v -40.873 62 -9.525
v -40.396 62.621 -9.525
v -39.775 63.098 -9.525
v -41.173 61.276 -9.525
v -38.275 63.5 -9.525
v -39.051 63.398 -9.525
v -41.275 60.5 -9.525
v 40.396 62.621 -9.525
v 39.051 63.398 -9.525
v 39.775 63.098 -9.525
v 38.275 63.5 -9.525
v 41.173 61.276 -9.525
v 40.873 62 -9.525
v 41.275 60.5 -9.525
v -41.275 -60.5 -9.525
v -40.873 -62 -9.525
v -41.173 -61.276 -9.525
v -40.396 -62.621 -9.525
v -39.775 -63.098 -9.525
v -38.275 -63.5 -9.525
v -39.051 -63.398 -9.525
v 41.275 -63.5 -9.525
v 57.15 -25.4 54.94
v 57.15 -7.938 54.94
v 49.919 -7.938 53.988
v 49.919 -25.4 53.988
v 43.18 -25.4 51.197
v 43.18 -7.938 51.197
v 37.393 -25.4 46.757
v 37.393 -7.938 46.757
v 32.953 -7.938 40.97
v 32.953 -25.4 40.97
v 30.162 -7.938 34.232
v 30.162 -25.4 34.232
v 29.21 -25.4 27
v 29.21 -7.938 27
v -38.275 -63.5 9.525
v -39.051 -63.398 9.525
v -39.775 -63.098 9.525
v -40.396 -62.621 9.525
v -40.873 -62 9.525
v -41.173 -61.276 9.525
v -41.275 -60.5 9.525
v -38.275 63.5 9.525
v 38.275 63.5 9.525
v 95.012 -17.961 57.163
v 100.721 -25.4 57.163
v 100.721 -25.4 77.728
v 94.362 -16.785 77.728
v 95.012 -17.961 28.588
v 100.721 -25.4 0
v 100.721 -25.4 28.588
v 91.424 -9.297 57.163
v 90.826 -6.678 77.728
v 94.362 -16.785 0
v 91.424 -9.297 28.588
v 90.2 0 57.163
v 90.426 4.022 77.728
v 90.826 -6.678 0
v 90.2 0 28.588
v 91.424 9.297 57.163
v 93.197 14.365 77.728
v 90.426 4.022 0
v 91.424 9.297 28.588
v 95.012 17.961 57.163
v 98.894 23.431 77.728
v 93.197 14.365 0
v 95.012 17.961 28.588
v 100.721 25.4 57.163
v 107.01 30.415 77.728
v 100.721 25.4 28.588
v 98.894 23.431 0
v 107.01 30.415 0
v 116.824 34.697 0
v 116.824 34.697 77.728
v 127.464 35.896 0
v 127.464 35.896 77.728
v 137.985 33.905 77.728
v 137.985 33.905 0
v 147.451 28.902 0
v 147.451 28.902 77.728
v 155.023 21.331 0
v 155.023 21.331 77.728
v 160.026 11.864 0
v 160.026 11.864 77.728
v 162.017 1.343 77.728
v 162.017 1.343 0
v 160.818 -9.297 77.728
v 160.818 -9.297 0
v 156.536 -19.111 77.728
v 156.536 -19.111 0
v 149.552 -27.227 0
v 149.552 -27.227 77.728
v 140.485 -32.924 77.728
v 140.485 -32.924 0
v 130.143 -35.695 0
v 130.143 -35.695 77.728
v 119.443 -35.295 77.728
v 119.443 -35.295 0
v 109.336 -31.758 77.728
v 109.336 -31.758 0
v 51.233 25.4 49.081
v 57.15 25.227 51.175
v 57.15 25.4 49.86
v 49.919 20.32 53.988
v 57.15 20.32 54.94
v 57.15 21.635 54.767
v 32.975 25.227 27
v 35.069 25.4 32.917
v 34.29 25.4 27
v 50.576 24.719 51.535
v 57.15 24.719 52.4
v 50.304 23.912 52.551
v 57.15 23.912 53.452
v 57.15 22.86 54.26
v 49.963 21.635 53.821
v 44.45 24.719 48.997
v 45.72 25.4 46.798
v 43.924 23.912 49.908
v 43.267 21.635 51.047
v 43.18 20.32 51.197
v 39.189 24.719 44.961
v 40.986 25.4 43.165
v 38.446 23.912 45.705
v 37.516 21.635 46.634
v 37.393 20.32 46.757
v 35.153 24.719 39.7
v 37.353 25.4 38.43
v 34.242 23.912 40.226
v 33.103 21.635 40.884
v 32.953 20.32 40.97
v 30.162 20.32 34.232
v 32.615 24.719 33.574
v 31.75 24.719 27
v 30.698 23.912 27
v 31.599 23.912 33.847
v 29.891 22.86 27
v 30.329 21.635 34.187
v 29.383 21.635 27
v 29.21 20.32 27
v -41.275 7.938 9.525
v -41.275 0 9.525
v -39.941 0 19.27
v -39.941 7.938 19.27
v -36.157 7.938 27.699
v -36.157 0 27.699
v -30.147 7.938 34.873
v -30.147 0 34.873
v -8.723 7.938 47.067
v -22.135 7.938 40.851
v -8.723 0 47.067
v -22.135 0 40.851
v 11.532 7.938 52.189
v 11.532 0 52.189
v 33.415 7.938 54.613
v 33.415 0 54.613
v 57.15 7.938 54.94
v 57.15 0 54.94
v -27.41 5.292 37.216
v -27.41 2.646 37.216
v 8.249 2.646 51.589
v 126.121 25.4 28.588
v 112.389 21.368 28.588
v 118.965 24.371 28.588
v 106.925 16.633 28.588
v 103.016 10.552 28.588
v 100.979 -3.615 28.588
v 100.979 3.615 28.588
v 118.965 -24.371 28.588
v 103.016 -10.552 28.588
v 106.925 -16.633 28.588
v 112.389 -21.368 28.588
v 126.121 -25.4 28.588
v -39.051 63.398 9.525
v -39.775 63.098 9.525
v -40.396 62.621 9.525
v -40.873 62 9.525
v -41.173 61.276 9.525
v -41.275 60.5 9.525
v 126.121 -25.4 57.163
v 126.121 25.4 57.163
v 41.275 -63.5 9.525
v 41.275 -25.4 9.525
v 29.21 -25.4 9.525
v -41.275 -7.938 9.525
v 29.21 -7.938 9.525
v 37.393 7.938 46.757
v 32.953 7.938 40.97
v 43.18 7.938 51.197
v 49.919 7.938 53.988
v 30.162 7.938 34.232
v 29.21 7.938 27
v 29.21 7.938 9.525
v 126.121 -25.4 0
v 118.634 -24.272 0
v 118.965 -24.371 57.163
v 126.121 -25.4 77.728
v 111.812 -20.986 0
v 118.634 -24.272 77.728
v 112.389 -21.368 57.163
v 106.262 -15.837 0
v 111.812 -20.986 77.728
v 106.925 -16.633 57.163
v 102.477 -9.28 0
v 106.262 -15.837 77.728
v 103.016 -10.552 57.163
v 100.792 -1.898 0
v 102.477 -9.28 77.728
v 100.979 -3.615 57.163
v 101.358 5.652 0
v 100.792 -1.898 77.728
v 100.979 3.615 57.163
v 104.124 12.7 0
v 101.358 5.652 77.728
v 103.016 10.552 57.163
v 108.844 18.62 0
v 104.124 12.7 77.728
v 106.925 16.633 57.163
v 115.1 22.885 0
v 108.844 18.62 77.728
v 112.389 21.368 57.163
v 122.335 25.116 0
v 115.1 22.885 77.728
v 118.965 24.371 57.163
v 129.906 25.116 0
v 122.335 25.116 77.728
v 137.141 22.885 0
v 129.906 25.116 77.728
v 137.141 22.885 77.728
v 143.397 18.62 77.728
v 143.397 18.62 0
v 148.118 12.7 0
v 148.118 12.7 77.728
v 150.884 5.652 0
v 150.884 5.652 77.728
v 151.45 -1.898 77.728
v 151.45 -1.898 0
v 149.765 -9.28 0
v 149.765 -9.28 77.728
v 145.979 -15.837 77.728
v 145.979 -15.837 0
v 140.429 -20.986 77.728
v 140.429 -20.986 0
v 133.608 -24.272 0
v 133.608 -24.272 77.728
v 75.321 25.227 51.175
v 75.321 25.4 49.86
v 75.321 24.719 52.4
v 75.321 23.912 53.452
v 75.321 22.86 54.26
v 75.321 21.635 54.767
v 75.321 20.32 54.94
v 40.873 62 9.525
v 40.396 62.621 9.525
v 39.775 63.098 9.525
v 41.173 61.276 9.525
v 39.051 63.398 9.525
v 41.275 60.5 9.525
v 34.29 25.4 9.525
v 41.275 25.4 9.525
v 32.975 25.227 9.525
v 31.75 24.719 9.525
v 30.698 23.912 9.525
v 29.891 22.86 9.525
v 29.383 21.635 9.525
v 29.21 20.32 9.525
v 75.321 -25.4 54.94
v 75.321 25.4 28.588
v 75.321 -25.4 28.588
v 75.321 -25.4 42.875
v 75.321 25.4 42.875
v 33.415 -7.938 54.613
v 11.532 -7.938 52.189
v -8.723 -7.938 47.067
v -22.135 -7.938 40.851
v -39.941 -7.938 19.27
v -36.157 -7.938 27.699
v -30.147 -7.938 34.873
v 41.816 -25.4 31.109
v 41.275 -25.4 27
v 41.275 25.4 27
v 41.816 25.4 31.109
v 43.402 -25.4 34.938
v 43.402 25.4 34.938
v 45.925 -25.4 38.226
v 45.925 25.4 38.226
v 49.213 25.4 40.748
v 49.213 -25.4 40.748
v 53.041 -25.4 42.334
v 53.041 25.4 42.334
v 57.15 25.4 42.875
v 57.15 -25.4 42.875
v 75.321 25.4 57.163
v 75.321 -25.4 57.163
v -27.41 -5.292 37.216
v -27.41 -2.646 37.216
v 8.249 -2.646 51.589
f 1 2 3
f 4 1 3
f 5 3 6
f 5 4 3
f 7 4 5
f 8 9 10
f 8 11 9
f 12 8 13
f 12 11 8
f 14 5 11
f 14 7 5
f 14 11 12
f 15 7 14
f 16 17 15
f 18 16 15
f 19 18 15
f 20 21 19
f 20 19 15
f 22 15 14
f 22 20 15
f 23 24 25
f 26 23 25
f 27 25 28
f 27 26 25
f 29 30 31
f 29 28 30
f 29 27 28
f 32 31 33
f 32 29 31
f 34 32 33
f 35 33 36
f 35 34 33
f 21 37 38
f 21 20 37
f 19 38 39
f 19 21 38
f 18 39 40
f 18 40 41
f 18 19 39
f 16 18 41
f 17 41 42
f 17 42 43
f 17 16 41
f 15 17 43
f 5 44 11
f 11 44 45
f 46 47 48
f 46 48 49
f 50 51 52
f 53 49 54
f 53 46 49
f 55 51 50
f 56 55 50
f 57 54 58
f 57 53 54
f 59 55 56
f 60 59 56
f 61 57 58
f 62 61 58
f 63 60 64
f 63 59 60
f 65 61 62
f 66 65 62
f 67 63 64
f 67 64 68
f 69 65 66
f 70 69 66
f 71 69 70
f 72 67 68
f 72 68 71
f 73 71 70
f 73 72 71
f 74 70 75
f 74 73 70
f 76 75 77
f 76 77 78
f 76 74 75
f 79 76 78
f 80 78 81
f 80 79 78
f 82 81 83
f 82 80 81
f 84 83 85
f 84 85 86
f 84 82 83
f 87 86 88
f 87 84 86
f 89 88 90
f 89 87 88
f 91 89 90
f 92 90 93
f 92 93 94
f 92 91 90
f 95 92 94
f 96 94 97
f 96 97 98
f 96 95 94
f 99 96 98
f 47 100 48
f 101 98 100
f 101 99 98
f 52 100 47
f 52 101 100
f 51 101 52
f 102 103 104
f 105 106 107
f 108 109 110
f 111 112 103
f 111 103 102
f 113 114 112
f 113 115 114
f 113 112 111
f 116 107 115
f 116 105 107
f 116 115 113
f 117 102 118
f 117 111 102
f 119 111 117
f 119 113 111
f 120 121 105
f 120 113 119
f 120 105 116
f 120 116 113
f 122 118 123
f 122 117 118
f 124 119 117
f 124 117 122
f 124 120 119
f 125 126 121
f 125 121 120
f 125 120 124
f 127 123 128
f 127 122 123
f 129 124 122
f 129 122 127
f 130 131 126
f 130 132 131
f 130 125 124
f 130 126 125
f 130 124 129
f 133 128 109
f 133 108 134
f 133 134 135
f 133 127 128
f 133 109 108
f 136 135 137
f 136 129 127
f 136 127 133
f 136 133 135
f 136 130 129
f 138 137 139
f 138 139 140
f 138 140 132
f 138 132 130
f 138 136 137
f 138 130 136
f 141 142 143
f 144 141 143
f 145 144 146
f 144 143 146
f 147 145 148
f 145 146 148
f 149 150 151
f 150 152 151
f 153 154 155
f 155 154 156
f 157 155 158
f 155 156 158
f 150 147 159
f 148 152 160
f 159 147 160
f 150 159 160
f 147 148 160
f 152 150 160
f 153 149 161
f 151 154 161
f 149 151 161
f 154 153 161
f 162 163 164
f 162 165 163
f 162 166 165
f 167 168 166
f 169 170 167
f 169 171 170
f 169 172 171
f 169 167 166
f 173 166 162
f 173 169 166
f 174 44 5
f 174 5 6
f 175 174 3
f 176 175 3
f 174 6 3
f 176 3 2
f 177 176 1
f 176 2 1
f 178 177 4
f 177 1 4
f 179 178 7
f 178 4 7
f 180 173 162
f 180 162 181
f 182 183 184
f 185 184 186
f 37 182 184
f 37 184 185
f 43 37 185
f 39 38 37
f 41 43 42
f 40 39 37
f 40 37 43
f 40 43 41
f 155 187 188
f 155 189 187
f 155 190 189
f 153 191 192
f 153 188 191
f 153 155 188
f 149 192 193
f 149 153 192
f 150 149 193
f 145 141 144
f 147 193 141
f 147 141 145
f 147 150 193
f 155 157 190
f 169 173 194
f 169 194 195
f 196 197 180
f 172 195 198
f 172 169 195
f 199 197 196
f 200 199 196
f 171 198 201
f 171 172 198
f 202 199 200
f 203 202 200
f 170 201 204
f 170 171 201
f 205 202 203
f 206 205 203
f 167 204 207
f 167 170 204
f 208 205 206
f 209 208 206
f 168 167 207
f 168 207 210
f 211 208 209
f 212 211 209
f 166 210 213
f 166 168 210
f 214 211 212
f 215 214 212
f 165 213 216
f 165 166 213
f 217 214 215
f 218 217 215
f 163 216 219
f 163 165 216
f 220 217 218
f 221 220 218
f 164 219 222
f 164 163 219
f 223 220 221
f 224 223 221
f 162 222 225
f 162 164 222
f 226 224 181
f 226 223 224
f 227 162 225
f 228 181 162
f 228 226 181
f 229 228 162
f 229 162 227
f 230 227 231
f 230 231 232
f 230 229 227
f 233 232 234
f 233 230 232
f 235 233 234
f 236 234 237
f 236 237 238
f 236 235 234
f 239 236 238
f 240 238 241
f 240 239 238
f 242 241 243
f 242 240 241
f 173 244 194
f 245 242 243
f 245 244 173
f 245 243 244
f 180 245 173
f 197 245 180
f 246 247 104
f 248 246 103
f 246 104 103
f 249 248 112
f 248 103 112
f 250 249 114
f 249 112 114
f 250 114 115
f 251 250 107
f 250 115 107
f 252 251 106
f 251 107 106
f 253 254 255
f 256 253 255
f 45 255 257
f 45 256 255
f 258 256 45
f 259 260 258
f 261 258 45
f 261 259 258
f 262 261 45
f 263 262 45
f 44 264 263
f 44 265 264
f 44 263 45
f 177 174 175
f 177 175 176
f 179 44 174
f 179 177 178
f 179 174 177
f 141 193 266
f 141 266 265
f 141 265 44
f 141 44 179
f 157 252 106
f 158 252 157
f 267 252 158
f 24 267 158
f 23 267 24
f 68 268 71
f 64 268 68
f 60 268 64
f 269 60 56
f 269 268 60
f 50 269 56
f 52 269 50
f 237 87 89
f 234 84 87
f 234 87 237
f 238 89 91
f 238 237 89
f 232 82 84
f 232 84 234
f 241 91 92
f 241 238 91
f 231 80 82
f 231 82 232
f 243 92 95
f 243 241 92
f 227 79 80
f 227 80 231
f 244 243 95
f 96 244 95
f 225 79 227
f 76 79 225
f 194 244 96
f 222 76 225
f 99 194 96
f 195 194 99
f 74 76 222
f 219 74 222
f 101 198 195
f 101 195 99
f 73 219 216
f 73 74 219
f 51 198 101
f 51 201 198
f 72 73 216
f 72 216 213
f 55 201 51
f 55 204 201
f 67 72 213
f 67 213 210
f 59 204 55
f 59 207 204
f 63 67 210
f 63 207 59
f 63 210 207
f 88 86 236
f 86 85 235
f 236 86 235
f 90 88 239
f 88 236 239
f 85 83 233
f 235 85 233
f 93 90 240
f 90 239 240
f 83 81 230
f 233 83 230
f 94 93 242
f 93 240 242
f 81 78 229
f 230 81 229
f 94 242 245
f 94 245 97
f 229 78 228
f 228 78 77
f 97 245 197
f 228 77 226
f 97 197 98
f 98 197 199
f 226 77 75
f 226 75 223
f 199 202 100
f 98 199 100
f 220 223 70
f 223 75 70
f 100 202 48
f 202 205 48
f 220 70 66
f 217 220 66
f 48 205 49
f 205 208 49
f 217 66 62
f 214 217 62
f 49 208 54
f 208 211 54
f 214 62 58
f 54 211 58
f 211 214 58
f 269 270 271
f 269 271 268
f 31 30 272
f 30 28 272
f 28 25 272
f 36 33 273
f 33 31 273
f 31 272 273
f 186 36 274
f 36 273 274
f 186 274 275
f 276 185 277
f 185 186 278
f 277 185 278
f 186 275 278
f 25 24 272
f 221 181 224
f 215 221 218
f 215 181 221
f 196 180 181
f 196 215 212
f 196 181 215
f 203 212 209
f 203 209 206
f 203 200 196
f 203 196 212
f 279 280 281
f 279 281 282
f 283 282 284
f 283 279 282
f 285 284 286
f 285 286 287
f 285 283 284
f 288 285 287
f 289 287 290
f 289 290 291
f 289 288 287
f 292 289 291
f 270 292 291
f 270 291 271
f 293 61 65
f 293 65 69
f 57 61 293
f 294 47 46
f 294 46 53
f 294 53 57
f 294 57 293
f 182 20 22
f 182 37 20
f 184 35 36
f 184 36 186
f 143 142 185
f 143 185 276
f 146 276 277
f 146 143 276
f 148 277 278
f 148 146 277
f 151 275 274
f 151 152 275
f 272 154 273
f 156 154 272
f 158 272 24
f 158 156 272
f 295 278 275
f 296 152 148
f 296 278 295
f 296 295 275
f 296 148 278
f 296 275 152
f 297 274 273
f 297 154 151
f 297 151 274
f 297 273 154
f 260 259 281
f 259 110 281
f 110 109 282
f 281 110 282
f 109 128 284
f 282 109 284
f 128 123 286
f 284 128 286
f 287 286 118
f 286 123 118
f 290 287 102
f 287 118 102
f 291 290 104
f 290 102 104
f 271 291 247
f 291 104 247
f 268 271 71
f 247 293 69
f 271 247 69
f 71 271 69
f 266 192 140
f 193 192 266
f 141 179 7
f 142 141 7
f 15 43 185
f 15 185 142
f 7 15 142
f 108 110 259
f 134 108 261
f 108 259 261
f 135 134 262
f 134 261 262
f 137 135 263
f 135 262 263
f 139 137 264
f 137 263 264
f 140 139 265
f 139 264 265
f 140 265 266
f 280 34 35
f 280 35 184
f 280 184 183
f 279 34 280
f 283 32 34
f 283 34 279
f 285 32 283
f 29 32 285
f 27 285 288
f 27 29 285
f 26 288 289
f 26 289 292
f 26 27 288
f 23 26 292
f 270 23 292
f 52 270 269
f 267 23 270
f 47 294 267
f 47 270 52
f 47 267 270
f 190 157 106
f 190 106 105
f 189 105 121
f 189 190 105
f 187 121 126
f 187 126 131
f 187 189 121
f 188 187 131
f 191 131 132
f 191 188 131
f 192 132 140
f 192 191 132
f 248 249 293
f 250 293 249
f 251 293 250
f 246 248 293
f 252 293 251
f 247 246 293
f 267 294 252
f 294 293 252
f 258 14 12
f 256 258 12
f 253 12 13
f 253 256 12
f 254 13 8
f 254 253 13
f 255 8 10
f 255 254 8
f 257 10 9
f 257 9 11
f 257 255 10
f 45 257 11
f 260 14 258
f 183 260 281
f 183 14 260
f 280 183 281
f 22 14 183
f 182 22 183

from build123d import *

# Parameters (mm, degrees)
F1_DEPTH = 63.5
F2_DEPTH = 25.4
F3_DEPTH = 7.9375
F4_W     = 25.4
F4_H     = 28.5877
F4_H_2   = 28.575
F4_H_3   = 20.5653703187
F6_R     = 3
F7_R     = 5.08


with BuildPart() as f1:
    # F0 (on Front) → F1 (new body, symmetric)
    with BuildSketch(Plane.XZ):
        Polygon((29.2099986579, 9.525), (-41.275, 9.525), (-41.275, -9.525), (41.275, -9.525), (41.275, 9.525), align=None)
    extrude(amount=F1_DEPTH, both=True)

    # F0 (on Front) → F2 (join, symmetric)
    with BuildSketch(Plane.XZ):
        with BuildLine():
            Line((29.2099986579, 27.0002), (29.2099986579, 9.525))
            Line((29.2099986579, 9.525), (41.275, 9.525))
            Line((41.275, 9.525), (41.275, 27.0002))
            ThreePointArc((41.275, 27.0002), (45.9246798487, 38.2255201513), (57.15, 42.8752))
            Line((57.15, 42.8752), (75.3208244484, 42.8752))
            Line((75.3208244484, 42.8752), (75.3208244484, 54.9402013421))
            Line((75.3208244484, 54.9402013421), (57.15, 54.9402013421))
            ThreePointArc((57.15, 54.9402013421), (37.3934355846, 46.7567644154), (29.2099986579, 27.0002))
        make_face()
        Polygon((75.3208244484, 57.1627), (75.3208244484, 54.9402013421), (75.3208244484, 42.8752), (75.3208244484, 28.5877), (126.1208244484, 28.5877), (126.1208244484, 57.1627), align=None)
    extrude(amount=F2_DEPTH, both=True)

    # F0 (on Front) → F3 (join, symmetric)
    with BuildSketch(Plane.XZ):
        with BuildLine():
            add(Edge.make_bspline(
                [(-41.275, 9.525), (-41.1590449512, 44.640161097), (4.4794571586, 56.3350282609), (57.15, 54.9402013421)],
                knots=[0, 0, 0, 0, 108.3975144454, 108.3975144454, 108.3975144454, 108.3975144454], degree=3))
            Line((-41.275, 9.525), (29.2099986579, 9.525))
            Line((29.2099986579, 9.525), (29.2099986579, 27.0002))
            ThreePointArc((29.2099986579, 27.0002), (37.3934355846, 46.7567644154), (57.15, 54.9402013421))
        make_face()
    extrude(amount=F3_DEPTH, both=True)

    # F4 (on face) → F5 (revolve)
    with BuildSketch(Plane.XZ.offset(25.4)):
        with Locations((113.4208244484, 14.29385)):
            Rectangle(F4_W, F4_H)
        with Locations((113.4208244484, 42.8752)):
            Rectangle(F4_W, F4_H_2)
        with Locations((113.4208244484, 67.4453851593)):
            Rectangle(F4_W, F4_H_3)
    revolve(axis=Axis((126.1208244484, 0, 42.8752), (0, 0, -1)))

    # F6
    f6_edges = [f1.edges().sort_by_distance(p)[0] for p in [
        (-41.275, 63.5, 0),
        (41.275, 63.5, 0),
        (-41.275, -63.5, 0),
    ]]
    fillet(f6_edges, radius=F6_R)

    # F7
    f7_edges = [f1.edges().sort_by_distance(p)[0] for p in [
        (37.393436, 25.4, 46.756764),
    ]]
    fillet(f7_edges, radius=F7_R)


solid = f1.part
